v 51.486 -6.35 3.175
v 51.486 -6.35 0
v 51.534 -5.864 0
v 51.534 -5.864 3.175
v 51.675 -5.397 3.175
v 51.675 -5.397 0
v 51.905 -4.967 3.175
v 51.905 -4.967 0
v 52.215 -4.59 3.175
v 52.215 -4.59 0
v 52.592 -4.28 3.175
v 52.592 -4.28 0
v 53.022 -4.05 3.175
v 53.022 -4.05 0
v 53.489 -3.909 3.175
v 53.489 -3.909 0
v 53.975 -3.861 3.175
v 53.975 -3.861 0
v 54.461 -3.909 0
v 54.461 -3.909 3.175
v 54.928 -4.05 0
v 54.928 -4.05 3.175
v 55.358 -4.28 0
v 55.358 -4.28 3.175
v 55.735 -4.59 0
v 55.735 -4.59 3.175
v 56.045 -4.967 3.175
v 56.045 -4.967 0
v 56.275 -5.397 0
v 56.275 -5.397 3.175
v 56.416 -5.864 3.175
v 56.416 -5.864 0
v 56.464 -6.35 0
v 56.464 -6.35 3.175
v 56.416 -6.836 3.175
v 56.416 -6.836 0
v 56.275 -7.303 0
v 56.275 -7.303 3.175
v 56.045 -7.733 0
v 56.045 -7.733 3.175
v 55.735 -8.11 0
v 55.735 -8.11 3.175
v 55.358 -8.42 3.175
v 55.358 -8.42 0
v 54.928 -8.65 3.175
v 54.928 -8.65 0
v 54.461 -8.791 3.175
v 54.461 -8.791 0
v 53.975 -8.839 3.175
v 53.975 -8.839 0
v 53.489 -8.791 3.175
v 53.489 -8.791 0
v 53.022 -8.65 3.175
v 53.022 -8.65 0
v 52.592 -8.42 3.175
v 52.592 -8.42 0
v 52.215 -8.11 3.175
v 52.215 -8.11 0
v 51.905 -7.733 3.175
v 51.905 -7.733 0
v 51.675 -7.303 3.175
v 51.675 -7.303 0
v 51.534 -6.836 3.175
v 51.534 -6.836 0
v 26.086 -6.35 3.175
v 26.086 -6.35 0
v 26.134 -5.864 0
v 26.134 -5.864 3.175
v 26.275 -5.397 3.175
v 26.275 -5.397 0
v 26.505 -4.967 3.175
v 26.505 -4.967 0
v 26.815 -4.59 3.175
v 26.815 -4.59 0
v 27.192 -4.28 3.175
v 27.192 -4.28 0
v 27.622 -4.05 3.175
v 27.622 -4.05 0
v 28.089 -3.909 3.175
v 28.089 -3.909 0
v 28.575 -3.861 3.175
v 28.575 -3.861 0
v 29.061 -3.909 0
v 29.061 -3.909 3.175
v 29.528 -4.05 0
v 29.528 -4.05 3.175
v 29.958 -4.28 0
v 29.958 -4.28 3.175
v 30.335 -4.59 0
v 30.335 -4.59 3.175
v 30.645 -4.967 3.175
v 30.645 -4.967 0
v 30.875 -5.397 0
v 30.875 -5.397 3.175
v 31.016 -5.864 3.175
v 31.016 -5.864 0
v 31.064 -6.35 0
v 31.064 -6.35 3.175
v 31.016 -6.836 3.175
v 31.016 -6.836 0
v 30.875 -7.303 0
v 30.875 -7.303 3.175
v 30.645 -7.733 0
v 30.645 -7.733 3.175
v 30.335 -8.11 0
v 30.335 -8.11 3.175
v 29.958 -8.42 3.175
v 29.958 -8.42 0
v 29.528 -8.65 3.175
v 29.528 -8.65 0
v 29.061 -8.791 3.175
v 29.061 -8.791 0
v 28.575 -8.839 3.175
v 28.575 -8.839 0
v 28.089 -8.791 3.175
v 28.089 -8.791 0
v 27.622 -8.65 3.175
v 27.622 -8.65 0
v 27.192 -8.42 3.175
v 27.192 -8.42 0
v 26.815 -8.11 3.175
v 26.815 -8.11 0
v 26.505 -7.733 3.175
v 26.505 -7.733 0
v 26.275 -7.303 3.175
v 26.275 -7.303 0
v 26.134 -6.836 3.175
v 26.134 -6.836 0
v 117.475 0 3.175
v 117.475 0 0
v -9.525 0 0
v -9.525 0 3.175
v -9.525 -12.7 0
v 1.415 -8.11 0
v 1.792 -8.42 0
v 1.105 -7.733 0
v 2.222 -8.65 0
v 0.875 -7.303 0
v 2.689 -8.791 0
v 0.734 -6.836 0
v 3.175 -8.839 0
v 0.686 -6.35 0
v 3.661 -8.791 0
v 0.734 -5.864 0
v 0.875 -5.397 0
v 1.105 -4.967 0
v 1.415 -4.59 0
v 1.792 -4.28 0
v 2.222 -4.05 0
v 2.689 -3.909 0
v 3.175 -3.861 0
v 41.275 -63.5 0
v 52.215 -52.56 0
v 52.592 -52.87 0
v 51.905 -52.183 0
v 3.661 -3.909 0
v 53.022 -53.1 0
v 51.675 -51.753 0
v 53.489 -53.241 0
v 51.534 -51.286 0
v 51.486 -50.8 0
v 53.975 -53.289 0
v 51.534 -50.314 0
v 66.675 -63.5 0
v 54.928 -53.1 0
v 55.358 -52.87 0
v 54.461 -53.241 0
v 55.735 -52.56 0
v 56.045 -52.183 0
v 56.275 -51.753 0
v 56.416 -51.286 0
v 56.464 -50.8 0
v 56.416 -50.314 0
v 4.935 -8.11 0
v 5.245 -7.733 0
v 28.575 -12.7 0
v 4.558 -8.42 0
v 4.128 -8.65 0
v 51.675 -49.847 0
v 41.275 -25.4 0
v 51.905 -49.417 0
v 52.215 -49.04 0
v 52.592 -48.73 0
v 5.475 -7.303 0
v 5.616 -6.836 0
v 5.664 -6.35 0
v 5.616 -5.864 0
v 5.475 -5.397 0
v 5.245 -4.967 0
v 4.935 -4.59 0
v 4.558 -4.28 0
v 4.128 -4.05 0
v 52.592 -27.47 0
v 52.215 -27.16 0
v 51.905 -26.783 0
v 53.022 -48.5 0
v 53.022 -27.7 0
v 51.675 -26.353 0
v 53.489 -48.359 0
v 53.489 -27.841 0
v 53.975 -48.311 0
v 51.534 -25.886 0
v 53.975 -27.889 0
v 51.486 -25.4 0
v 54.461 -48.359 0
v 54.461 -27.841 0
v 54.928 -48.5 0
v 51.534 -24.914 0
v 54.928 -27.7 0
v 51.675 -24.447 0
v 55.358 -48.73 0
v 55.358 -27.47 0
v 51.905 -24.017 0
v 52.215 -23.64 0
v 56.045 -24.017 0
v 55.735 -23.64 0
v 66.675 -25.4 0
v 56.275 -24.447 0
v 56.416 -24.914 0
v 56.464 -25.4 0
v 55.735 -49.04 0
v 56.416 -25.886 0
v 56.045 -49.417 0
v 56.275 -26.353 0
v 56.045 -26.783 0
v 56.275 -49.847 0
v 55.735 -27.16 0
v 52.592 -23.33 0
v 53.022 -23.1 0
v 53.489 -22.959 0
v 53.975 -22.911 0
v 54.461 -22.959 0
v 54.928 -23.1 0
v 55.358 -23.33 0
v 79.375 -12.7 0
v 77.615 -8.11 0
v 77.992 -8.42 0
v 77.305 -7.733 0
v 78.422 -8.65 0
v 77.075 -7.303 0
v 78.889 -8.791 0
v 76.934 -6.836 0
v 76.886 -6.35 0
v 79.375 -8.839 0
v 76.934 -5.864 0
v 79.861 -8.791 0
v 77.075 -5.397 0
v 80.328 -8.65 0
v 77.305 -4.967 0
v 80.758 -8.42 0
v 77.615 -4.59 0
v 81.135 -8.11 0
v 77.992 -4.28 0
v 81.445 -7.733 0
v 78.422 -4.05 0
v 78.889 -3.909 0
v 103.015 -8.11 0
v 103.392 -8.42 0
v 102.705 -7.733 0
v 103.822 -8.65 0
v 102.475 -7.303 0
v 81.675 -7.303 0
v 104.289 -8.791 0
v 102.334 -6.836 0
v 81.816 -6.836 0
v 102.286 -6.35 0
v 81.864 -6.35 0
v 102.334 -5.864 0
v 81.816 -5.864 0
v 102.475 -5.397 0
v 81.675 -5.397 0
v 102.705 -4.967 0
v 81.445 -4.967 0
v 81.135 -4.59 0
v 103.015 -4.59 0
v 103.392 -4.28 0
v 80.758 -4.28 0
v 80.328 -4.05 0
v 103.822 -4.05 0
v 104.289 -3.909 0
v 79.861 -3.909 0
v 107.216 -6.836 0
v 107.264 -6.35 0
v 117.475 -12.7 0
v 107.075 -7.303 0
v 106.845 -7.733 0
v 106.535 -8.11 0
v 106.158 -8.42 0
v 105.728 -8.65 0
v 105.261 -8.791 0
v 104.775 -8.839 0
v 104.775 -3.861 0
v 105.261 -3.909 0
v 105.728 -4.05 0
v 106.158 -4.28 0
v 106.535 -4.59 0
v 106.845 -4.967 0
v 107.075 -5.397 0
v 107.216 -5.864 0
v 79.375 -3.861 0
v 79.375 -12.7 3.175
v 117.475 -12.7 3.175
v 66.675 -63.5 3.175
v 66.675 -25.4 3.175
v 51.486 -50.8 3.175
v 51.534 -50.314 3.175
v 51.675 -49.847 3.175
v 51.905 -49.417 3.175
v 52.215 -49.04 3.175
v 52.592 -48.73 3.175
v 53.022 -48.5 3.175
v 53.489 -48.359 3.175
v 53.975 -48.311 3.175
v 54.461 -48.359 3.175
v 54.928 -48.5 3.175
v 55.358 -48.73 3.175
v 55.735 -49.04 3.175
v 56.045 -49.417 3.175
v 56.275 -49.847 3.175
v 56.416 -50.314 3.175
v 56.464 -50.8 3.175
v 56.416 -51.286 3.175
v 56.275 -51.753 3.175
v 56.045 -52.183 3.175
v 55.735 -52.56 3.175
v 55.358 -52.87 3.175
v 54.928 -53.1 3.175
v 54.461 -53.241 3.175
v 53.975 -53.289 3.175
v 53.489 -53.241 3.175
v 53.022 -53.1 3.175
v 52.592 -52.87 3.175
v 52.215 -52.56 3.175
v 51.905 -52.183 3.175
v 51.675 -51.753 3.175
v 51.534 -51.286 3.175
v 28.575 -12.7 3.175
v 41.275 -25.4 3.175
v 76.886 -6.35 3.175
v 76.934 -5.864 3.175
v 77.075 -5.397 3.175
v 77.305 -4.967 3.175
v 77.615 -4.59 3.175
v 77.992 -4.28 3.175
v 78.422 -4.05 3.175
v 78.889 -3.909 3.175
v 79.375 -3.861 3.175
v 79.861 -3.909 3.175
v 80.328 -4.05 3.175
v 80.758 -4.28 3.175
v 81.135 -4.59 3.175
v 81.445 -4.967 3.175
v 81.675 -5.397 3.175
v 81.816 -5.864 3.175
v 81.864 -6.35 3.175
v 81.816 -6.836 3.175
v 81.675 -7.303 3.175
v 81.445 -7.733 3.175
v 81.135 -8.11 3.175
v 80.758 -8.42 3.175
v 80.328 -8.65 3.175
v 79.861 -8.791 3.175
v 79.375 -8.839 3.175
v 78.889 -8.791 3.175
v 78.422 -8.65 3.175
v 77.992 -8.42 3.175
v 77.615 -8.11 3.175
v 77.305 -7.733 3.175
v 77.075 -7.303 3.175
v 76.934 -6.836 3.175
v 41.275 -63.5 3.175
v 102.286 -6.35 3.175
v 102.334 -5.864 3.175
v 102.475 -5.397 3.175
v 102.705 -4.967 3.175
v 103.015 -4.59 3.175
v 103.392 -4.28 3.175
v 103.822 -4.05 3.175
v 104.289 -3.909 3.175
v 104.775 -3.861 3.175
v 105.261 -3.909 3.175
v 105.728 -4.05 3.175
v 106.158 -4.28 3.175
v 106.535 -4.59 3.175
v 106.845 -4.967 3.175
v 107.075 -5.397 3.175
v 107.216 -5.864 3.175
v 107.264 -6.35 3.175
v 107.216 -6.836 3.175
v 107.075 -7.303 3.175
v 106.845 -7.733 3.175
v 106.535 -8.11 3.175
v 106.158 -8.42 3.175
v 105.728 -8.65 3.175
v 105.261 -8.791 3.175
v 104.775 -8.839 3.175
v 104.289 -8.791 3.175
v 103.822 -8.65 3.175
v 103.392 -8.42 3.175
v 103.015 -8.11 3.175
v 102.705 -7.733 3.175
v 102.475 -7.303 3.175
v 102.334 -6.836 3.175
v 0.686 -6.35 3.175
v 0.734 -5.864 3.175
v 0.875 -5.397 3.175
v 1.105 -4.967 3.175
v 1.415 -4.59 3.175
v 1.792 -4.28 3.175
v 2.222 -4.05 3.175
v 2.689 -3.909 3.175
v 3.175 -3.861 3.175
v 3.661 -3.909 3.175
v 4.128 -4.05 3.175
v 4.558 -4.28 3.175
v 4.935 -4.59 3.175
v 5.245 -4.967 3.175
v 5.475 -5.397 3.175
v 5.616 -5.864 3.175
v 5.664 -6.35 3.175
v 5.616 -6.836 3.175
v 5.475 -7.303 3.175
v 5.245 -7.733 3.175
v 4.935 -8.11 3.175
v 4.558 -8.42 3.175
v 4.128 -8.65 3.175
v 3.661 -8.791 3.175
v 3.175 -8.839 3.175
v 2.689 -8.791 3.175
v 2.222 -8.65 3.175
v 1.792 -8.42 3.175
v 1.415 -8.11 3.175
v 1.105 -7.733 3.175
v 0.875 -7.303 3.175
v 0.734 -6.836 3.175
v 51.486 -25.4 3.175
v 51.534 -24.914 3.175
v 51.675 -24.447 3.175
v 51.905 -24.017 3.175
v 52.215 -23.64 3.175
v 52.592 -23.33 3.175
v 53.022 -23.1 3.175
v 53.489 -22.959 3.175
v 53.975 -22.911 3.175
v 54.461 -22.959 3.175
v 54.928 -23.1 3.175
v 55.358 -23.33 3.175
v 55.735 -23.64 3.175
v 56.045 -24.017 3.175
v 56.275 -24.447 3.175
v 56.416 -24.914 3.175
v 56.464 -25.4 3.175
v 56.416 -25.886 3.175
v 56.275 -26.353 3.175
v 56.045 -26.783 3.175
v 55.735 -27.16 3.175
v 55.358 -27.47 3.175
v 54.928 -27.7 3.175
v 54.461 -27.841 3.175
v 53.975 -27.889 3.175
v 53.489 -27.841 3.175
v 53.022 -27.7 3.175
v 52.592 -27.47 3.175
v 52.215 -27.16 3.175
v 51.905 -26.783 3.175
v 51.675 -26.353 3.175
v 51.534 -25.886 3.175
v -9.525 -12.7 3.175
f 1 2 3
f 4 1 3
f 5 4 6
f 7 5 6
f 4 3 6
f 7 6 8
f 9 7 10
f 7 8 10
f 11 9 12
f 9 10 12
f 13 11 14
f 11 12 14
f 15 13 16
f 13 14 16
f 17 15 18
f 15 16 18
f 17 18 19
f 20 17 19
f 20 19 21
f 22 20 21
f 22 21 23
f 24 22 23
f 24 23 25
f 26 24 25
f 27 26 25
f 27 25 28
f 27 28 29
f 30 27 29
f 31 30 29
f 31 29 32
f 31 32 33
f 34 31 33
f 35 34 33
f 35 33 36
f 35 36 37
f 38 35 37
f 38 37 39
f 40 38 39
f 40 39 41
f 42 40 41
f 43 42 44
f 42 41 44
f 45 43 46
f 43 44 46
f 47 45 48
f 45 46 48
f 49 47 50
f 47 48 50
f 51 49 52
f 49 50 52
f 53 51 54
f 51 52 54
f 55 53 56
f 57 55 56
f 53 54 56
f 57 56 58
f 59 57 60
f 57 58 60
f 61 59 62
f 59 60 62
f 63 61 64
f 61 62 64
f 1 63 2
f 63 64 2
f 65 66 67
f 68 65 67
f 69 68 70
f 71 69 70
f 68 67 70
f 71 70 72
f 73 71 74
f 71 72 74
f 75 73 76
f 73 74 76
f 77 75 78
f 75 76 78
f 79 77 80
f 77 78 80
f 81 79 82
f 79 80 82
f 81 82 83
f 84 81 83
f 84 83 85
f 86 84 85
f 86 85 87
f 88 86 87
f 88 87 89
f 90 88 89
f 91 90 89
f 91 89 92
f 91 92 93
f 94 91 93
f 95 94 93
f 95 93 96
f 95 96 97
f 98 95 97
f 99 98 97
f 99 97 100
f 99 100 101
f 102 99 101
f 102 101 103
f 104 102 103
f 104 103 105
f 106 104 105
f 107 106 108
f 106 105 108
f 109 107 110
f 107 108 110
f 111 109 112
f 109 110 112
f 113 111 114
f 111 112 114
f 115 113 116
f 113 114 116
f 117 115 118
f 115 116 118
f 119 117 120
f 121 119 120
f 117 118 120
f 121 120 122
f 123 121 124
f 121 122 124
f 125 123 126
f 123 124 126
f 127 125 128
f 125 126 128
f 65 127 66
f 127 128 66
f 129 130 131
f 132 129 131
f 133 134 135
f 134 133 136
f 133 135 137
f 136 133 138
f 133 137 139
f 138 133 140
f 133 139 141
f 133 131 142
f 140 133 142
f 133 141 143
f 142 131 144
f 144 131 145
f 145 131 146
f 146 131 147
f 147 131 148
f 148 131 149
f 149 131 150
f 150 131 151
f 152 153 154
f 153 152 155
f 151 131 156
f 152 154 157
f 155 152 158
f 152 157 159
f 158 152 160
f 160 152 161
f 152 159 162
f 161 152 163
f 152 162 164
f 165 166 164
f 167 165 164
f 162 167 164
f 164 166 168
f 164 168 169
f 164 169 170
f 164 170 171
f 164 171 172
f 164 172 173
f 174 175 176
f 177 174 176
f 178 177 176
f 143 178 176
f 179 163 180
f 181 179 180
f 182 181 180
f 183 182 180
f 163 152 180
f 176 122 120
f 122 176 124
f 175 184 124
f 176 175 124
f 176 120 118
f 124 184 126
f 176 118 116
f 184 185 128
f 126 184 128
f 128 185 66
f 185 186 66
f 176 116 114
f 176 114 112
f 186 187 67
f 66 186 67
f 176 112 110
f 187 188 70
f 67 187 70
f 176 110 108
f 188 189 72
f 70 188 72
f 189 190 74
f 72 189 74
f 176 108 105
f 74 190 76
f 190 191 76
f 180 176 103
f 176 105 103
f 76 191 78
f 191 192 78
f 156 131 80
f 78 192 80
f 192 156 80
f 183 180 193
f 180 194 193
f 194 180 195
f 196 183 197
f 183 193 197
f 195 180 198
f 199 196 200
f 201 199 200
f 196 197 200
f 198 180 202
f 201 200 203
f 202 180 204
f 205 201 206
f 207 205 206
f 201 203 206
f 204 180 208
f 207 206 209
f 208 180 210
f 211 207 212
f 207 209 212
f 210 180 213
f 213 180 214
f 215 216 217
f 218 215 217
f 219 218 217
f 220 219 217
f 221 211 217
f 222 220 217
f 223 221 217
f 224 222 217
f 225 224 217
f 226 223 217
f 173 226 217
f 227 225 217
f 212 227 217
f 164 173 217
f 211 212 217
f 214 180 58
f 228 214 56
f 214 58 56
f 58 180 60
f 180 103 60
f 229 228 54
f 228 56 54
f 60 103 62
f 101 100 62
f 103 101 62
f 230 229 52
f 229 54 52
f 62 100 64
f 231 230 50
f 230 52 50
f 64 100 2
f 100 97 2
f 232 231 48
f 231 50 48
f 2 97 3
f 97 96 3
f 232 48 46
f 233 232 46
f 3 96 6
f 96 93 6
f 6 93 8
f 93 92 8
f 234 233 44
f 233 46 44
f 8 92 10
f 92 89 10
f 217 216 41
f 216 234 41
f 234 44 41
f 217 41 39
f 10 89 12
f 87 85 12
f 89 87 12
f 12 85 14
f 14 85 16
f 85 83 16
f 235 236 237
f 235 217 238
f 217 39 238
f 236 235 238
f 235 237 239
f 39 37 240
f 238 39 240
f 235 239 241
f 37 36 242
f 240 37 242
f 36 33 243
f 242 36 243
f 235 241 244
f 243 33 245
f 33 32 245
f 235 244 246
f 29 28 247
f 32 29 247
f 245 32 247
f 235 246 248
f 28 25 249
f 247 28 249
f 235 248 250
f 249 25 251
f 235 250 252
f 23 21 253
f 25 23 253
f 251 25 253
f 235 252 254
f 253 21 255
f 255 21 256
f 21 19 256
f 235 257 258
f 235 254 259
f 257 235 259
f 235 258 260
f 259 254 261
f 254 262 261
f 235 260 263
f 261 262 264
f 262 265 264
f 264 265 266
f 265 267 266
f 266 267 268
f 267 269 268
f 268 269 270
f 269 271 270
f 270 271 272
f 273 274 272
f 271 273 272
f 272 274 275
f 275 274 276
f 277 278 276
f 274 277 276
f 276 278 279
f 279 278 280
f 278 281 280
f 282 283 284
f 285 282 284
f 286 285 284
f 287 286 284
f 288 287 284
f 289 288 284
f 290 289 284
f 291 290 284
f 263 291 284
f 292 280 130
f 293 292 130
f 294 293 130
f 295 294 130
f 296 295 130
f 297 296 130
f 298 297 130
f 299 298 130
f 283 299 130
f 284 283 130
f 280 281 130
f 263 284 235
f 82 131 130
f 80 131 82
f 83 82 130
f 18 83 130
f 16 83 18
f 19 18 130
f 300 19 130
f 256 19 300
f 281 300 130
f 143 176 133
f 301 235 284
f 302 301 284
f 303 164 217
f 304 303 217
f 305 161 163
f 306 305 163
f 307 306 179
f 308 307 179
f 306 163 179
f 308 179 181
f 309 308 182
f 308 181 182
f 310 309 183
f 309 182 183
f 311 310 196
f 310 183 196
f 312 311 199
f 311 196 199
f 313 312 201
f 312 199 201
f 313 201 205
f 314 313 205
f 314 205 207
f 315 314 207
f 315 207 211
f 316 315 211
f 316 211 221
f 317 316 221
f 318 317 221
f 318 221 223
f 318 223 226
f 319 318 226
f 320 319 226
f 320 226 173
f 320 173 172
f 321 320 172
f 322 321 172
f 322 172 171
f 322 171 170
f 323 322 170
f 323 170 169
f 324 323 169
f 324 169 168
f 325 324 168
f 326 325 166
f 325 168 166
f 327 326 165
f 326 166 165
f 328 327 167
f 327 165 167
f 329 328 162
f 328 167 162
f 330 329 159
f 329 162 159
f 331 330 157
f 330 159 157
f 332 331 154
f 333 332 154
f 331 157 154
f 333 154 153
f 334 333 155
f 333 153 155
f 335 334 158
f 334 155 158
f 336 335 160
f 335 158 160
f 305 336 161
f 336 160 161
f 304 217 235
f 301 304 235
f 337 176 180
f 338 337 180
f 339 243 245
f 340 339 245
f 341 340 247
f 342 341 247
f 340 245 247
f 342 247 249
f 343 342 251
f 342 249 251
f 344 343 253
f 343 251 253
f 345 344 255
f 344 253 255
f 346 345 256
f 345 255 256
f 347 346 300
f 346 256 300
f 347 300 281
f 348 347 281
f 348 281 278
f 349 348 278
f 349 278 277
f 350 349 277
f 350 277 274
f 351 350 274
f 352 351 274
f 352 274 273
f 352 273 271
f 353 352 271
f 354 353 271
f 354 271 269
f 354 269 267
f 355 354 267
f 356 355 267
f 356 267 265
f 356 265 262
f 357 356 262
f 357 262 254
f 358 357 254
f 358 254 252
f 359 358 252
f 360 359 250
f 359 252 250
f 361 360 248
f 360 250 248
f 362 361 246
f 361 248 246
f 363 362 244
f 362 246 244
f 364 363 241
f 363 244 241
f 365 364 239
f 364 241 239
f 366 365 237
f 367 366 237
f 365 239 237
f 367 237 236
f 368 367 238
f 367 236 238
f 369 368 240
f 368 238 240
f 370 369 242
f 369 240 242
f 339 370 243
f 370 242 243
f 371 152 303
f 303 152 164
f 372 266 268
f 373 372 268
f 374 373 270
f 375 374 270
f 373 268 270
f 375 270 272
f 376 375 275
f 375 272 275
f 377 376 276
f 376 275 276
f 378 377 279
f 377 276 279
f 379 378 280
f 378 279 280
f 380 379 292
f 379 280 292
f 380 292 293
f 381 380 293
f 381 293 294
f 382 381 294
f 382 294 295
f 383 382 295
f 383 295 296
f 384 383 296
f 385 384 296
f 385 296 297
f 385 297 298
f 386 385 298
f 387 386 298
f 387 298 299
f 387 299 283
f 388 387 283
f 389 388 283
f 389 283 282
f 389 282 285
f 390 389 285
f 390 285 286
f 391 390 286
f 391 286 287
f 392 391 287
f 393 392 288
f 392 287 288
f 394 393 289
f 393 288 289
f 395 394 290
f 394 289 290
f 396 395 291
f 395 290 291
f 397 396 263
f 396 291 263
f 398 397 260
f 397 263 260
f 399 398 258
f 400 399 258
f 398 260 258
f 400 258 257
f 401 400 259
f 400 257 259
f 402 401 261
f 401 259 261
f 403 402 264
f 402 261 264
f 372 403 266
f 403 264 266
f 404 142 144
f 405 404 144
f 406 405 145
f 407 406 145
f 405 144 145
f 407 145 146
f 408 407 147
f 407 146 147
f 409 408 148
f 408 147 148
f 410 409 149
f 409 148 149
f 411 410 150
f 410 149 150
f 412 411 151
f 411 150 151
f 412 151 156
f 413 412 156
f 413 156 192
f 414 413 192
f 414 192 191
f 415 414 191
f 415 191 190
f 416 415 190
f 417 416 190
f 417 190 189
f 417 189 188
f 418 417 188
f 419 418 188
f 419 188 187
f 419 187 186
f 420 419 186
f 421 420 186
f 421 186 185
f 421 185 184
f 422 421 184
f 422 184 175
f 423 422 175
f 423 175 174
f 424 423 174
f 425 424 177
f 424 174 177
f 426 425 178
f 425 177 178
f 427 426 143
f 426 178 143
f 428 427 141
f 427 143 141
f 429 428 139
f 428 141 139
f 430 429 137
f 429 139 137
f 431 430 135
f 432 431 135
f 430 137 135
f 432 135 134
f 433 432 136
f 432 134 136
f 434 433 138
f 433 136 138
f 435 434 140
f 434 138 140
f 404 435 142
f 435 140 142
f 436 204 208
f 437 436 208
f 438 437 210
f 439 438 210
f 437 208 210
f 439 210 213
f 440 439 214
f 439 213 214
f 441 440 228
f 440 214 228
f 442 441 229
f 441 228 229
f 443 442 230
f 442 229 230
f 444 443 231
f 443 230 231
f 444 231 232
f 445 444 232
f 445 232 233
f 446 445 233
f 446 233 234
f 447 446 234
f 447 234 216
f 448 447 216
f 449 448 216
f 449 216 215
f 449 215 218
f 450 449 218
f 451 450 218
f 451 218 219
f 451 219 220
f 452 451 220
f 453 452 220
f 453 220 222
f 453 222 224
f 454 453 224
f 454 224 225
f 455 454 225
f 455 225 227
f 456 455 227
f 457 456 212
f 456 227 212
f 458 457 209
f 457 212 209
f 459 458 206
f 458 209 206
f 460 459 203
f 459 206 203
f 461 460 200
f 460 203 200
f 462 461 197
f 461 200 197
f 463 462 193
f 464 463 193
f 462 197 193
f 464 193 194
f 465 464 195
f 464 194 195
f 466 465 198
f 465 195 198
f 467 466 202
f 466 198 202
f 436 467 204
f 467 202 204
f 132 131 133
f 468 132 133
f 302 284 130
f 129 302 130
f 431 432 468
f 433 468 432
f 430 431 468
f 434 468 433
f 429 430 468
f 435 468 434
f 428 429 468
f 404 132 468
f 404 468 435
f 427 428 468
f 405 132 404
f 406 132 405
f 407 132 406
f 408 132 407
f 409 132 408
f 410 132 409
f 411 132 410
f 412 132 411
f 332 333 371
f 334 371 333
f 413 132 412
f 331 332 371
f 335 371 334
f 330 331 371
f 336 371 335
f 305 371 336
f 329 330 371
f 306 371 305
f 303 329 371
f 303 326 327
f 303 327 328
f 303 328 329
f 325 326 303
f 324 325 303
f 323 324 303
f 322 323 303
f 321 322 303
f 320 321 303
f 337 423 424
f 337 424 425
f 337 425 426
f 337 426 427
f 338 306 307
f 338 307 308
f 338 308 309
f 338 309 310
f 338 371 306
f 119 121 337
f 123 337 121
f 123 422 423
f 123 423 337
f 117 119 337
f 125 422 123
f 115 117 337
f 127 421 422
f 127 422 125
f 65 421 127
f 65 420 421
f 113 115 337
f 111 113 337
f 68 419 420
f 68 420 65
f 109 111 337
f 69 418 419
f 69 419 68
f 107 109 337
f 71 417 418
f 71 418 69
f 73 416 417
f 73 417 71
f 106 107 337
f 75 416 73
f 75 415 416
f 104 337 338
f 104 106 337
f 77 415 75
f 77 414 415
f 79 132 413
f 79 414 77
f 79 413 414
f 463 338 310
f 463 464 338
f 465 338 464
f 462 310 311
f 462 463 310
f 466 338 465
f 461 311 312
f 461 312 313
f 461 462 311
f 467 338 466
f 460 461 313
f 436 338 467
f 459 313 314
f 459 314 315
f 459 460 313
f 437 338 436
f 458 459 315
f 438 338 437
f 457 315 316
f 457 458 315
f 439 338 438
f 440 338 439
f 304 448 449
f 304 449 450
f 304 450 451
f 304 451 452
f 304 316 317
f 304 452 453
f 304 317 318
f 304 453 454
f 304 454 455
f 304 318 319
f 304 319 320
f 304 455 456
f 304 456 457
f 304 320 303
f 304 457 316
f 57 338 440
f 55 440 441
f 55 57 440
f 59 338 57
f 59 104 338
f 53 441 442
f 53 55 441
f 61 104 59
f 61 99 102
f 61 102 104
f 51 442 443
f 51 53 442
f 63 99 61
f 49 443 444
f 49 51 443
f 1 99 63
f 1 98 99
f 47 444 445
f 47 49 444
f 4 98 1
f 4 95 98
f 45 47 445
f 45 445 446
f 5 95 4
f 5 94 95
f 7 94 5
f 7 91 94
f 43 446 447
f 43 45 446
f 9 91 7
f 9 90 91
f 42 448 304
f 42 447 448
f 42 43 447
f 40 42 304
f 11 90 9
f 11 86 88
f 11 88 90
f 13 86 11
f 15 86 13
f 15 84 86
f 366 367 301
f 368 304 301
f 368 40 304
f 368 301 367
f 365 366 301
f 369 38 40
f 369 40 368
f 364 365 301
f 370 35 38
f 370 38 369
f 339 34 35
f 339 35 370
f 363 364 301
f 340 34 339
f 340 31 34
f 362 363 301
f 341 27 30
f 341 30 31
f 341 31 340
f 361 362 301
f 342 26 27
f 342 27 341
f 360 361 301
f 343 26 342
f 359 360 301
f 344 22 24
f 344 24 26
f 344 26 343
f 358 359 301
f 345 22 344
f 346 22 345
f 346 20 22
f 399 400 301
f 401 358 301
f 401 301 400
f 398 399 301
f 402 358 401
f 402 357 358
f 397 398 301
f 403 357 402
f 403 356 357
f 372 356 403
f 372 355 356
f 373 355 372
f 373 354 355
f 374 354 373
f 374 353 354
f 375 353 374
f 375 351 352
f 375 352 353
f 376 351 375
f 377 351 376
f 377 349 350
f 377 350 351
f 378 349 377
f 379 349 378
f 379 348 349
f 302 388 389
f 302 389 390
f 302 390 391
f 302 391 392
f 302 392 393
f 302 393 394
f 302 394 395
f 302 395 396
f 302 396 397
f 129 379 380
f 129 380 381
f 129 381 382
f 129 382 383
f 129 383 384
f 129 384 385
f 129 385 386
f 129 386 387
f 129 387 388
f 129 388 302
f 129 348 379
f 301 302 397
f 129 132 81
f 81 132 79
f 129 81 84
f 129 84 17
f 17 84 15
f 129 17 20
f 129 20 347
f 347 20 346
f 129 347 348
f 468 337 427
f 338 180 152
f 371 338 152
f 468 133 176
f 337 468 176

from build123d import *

# Parameters (mm, degrees)
BOSS_EXTRUDE1_DEPTH    = 3.175
F_10_CLEARANCE_HOLE1_D = 4.9784


with BuildPart() as part:
    # Sketch1 → Boss-Extrude1 (new body)
    with BuildSketch(Plane.XY):
        Polygon((41.275, -25.4), (41.275, -63.5), (66.675, -63.5), (66.675, -25.4), (79.375, -12.7), (117.475, -12.7), (117.475, 0), (-9.525, 0), (-9.525, -12.7), (28.575, -12.7), align=None)
    extrude(amount=BOSS_EXTRUDE1_DEPTH)

    # #10 Clearance Hole1 (through all)
    with Locations(Plane.XY.offset(3.175)):
        with Locations((3.175, -6.35), (28.575, -6.35), (53.975, -6.35), (104.775, -6.35), (53.975, -25.4), (53.975, -50.8), (79.375, -6.35)):
            Hole(F_10_CLEARANCE_HOLE1_D / 2)


solid = part.part
